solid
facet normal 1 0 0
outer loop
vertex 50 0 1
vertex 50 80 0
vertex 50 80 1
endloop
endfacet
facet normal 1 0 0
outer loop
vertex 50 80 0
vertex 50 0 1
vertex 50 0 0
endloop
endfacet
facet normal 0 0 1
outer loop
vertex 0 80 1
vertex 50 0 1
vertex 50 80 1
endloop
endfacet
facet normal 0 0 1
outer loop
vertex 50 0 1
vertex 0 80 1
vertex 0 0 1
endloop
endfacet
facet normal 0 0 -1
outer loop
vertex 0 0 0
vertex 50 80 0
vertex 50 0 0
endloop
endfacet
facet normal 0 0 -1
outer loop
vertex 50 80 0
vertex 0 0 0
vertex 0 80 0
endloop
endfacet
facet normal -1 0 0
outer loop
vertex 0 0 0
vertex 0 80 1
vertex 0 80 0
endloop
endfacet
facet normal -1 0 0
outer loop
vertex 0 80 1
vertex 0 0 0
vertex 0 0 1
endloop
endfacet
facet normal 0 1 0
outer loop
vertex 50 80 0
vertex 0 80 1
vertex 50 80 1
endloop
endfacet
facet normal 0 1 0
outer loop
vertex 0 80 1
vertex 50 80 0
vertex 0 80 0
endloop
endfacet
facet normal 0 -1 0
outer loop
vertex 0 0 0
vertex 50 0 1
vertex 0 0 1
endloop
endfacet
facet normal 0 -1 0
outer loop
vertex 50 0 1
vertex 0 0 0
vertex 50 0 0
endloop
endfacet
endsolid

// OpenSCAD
difference() {
	color(alpha = 1.0000000000, c = [0.2820000000, 0.2820000000, 1]) {
		cube(size = [50, 80, 1]);
	}
	translate(v = [30, 40, 0]) {
		rotate(a = [180, 0, 90]) {
			color(alpha = 1.0000000000, c = [0, 1, 0.2120000000]) {
				text(font = "Arial", halign = "center", size = 10, text = "A.R et M.J", valign = "center");
			}
		}
	}
	translate(v = [10, 40, 0]) {
		rotate(a = [180, 0, 90]) {
			color(alpha = 1.0000000000, c = [0, 1, 0.2120000000]) {
				text(font = "Arial", halign = "center", size = 10, text = "IFT 2125", valign = "center");
			}
		}
	}
}
